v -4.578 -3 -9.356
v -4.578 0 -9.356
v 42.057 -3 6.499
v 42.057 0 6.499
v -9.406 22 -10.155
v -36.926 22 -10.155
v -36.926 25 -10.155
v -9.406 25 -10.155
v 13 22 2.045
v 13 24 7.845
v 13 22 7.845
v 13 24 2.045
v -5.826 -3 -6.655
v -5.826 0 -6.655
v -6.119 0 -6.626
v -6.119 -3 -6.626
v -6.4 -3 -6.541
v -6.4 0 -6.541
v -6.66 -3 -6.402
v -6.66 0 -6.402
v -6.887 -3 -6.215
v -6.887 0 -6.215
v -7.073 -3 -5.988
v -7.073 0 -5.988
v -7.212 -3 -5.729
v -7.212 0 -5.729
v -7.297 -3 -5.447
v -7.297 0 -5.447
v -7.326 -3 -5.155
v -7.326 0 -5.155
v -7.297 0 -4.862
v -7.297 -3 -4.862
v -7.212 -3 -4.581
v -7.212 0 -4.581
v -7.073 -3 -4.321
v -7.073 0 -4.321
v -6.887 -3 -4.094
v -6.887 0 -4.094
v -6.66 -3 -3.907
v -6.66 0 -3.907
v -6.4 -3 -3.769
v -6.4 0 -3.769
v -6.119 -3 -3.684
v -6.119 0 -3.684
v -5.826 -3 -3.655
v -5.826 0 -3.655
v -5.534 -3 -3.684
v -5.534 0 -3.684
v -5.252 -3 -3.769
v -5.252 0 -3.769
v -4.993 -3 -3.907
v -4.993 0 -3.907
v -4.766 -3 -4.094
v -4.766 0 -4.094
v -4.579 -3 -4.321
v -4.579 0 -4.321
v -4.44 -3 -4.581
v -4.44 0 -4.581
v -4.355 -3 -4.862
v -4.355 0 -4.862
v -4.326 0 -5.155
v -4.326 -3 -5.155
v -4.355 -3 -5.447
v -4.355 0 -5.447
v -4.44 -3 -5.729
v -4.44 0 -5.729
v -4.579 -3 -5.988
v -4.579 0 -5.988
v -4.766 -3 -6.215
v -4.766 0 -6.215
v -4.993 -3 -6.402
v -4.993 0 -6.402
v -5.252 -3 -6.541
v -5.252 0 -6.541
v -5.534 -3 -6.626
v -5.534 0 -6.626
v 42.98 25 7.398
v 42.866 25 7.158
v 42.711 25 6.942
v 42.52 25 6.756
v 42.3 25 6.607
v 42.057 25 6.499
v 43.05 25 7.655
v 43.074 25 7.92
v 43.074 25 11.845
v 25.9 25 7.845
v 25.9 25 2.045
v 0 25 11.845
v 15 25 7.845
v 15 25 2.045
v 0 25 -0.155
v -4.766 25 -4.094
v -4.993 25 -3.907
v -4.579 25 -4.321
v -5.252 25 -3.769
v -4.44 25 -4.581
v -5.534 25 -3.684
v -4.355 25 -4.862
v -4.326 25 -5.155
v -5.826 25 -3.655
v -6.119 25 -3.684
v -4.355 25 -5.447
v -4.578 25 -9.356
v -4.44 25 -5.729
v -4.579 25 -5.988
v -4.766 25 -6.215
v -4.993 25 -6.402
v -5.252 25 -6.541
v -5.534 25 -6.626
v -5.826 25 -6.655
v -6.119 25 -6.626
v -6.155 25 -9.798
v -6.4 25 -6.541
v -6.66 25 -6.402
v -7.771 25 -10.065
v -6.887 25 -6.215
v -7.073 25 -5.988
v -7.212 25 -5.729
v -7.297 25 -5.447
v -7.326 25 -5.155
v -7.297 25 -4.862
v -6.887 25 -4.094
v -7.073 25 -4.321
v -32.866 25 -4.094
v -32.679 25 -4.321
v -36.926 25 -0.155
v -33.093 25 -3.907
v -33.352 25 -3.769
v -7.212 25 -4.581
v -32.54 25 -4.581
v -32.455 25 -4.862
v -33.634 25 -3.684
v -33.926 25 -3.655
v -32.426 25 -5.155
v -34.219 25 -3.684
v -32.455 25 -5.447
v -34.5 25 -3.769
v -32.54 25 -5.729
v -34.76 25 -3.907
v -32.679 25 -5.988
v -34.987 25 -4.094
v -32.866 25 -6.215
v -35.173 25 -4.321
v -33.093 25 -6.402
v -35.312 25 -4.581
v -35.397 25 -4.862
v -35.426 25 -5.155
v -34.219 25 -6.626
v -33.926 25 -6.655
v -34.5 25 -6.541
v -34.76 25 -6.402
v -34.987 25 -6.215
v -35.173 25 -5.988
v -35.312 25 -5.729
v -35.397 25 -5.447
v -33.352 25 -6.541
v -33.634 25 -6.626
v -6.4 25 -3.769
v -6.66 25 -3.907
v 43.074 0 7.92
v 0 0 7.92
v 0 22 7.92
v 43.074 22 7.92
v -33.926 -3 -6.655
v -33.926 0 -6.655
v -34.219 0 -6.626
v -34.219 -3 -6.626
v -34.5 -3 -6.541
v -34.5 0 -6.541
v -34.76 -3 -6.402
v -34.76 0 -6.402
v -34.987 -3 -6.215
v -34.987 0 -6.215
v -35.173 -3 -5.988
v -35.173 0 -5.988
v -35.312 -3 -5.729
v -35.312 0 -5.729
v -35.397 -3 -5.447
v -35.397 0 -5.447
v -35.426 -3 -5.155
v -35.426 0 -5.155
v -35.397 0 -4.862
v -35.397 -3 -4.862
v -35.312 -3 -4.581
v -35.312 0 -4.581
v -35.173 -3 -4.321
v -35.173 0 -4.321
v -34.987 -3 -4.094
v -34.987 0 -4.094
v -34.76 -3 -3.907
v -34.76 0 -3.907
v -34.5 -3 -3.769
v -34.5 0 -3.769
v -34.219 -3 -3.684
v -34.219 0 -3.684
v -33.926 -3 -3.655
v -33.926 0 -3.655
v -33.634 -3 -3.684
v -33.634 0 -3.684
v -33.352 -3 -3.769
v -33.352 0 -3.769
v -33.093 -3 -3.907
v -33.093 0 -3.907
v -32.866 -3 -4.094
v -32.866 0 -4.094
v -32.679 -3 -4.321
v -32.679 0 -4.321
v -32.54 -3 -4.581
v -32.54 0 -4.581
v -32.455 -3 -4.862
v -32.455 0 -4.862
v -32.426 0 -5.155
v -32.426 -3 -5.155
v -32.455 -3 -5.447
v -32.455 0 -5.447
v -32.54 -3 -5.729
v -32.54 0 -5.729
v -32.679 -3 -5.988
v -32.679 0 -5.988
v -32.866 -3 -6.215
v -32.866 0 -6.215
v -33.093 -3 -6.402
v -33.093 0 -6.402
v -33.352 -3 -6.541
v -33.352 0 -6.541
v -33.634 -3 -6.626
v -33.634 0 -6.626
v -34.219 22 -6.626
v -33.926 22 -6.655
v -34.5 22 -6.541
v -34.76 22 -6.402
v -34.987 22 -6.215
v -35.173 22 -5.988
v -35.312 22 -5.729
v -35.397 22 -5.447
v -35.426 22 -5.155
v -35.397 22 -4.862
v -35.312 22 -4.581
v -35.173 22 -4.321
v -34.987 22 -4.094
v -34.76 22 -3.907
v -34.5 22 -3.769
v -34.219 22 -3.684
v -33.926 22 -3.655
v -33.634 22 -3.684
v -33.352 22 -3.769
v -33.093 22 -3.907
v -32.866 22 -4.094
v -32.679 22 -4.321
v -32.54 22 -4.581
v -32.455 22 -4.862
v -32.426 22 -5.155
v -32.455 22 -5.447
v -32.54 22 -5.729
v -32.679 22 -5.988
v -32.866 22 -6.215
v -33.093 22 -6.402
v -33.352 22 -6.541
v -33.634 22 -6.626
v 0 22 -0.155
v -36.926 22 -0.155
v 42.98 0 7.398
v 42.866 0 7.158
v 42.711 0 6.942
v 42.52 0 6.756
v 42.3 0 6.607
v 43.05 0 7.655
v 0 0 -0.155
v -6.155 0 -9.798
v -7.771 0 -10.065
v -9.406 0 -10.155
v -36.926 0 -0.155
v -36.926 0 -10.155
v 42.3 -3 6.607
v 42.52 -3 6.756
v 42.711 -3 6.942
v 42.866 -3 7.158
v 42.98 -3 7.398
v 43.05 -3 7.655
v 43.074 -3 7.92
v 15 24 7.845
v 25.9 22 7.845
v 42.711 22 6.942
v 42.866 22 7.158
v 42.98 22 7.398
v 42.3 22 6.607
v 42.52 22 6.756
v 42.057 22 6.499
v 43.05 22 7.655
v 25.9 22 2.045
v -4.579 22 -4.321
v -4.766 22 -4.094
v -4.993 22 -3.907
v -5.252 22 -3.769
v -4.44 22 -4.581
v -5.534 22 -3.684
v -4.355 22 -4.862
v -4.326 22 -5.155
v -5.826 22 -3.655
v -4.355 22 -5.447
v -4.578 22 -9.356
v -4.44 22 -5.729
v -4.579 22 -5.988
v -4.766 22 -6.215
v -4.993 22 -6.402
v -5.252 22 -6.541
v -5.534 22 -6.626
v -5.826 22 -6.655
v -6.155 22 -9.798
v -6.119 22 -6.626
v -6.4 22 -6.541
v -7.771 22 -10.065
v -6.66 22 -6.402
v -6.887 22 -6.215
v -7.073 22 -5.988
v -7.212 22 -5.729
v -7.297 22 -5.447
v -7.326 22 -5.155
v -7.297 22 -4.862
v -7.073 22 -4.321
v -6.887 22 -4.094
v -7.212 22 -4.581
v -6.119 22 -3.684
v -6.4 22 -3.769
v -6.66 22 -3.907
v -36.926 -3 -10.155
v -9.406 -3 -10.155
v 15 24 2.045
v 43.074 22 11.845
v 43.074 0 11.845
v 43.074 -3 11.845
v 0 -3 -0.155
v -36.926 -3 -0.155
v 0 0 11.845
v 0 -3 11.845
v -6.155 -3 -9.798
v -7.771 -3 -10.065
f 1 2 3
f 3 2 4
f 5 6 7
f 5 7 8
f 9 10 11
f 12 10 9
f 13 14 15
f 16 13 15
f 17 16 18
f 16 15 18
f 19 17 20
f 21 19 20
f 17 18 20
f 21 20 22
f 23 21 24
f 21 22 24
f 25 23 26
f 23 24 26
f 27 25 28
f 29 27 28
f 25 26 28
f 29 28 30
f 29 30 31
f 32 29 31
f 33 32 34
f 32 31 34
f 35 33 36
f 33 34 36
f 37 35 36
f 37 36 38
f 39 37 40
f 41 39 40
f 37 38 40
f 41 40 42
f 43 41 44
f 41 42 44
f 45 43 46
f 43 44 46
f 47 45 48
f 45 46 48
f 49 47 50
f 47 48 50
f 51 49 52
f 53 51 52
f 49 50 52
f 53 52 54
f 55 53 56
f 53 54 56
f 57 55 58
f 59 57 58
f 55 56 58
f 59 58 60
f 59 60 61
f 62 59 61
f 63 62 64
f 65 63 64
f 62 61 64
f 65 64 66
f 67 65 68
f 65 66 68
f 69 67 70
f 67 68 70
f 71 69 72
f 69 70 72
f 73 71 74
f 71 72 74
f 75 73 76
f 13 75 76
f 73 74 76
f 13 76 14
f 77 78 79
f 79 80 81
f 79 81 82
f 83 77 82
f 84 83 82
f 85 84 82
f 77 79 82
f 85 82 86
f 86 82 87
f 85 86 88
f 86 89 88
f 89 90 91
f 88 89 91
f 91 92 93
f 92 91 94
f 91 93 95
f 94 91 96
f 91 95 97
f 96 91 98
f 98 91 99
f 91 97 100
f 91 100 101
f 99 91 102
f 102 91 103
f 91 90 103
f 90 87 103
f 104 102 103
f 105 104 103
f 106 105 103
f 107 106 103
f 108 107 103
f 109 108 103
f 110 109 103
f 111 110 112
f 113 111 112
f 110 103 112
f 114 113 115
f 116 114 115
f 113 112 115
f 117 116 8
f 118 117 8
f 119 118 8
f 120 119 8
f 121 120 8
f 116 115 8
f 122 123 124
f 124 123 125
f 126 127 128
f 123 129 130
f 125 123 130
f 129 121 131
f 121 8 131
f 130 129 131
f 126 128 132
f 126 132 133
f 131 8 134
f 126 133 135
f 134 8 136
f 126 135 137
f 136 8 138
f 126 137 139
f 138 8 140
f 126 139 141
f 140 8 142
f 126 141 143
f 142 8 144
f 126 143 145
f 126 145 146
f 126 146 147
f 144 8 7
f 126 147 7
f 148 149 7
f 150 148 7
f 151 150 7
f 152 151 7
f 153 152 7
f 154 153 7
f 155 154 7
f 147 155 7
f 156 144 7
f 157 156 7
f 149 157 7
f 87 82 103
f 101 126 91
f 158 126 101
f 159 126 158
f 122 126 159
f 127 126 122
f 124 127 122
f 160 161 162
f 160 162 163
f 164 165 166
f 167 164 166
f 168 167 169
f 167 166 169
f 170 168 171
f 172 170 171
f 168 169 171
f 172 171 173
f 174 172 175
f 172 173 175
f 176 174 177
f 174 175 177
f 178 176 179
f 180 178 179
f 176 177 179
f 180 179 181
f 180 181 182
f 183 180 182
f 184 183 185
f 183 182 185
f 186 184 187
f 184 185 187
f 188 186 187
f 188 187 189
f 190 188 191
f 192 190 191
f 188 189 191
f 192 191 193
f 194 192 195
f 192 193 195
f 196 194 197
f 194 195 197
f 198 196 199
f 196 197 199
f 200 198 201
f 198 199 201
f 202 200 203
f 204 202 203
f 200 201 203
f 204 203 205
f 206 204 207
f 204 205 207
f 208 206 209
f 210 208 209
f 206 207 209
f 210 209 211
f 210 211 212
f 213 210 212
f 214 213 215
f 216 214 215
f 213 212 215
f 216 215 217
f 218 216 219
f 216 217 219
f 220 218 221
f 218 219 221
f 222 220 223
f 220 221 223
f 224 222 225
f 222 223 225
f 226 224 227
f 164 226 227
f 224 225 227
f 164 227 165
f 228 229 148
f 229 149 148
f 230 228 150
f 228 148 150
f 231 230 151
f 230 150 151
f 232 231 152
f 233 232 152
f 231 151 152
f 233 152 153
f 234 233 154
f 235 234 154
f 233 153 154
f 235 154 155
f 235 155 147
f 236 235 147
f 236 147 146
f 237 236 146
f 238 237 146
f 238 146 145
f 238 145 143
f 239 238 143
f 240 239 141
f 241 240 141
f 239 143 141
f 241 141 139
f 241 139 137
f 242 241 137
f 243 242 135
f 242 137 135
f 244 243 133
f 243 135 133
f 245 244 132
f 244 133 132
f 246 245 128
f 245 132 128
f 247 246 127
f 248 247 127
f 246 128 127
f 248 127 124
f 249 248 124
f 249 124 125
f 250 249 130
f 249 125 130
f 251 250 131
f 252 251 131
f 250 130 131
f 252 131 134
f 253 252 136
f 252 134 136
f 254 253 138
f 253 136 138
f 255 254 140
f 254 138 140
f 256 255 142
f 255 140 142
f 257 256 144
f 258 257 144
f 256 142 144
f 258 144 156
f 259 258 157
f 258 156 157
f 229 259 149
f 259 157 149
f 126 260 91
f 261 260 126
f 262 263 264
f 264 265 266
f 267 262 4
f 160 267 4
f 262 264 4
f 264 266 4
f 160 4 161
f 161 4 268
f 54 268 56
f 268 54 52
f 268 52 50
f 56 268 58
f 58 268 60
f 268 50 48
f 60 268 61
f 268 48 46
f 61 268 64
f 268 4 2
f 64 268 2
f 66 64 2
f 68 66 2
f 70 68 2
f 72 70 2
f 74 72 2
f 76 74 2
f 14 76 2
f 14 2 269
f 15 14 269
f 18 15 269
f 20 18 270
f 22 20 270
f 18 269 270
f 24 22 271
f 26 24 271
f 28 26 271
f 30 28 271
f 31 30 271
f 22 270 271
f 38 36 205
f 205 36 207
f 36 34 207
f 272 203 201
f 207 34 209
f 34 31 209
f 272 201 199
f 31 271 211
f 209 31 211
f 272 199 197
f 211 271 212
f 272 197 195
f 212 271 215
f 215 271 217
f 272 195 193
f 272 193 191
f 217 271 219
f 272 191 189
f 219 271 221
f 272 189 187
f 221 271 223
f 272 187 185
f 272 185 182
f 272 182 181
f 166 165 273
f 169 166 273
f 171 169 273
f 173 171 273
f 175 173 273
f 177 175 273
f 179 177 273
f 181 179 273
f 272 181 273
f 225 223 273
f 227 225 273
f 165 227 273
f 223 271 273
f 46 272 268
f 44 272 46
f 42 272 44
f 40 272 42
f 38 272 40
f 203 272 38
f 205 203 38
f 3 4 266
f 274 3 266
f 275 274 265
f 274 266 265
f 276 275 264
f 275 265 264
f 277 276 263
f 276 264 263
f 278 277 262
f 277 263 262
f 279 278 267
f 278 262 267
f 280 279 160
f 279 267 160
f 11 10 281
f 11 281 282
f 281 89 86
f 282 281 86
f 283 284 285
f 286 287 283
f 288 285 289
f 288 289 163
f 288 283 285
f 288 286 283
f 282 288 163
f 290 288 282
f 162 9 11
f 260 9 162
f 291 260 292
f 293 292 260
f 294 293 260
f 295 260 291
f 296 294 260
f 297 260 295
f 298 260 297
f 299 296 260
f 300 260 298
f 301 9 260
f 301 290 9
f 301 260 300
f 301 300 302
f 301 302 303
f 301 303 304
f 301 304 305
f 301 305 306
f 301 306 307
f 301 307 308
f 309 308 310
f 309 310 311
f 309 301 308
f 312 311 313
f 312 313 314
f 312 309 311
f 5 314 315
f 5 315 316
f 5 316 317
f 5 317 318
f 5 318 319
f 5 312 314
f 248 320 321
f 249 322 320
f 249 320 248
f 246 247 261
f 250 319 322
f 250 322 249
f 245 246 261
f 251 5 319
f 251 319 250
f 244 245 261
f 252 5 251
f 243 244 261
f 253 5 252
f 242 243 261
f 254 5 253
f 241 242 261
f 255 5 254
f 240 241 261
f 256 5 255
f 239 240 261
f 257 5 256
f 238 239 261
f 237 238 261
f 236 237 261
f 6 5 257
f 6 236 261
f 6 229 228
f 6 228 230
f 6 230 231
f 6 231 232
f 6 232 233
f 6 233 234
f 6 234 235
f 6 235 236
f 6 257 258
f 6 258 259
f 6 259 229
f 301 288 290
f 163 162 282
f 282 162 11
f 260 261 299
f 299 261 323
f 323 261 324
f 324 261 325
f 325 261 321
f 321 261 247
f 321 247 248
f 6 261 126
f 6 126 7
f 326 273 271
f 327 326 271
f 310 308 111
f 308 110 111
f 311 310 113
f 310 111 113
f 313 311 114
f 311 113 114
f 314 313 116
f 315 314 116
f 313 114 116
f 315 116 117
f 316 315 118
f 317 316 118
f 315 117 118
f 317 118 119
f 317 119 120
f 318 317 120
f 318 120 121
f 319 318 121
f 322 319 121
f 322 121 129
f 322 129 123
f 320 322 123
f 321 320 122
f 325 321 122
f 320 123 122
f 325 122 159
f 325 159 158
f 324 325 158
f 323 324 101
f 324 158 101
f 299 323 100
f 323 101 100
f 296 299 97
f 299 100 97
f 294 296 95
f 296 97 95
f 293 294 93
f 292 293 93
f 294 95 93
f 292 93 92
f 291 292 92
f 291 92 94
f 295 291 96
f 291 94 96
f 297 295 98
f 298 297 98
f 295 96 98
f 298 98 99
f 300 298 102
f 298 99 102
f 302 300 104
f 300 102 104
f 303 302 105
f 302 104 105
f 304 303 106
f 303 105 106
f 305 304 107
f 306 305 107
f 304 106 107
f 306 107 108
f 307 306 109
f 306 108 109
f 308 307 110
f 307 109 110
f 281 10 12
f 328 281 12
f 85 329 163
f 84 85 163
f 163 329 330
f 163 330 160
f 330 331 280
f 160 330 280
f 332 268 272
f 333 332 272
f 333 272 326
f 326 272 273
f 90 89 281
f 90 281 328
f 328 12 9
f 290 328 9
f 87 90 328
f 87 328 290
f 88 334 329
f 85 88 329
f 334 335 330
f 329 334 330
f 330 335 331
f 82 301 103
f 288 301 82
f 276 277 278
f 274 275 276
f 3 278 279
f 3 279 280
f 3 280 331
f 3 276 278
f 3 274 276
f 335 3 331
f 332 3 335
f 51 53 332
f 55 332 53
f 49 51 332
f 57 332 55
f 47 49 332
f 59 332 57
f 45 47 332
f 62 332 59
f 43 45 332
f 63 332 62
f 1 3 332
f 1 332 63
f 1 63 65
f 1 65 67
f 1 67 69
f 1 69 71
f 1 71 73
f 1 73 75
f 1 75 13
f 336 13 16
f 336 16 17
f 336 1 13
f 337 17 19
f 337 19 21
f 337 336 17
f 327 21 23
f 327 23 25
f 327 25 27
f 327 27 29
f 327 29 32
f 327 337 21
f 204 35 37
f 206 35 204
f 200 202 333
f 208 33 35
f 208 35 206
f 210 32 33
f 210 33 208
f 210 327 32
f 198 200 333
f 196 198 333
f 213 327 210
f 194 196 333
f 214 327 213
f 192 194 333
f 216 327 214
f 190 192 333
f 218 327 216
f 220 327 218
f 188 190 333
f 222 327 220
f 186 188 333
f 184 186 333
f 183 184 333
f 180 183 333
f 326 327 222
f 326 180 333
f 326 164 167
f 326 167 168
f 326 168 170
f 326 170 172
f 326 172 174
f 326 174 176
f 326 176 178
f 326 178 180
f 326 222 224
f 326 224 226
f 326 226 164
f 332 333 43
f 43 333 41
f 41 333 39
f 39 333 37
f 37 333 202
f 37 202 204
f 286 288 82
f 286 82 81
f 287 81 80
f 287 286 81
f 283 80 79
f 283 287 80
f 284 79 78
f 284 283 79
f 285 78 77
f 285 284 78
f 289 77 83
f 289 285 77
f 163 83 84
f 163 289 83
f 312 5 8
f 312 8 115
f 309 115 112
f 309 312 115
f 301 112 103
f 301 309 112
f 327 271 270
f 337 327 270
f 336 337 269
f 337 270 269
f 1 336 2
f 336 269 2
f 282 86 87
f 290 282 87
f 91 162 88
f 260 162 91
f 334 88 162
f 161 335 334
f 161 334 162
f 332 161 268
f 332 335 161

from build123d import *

# Parameters (mm, degrees)
BOSS_EXTRUDE1_DEPTH                      = 3
BOSS_EXTRUDE2_START                      = 22
BOSS_EXTRUDE2_DEPTH                      = 3
SKETCH3_W                                = 1.5
SKETCH3_H                                = 28
F_3_0MM_CLEARANCE_DOWEL_HOLE1_AT_2_COUNT = 2
F_3_0MM_CLEARANCE_DOWEL_HOLE1_AT_2_PITCH = 28.1
SKETCH5_W                                = 43.073811931
SKETCH5_H                                = 3.925670489
BOSS_EXTRUDE3_DEPTH                      = 22
SKETCH6_W                                = 12.9
SKETCH6_H                                = 5.8
CUT_EXTRUDE1_DEPTH                       = 10
SKETCH7_W                                = 5.8
SKETCH7_H                                = 1
BOSS_EXTRUDE4_DEPTH                      = 2


with BuildPart() as part:
    # Sketch1 → Boss-Extrude1 (new body)
    with BuildSketch(Plane(origin=(0, 0, 0), x_dir=(1, 0, 0), z_dir=(0, 1, 0))):
        with BuildLine():
            Line((-4.577926811, 9.356292891), (42.056666031, -6.499468675))
            ThreePointArc((42.056666031, -6.499468675), (42.793295664, -7.04620955), (43.073811931, -7.919627792))
            Line((43.073811931, -7.919627792), (43.073811931, -11.845298281))
            Line((43.073811931, -11.845298281), (0, -11.845298281))
            Line((0, -11.845298281), (0, 0.154701719))
            Line((0, 0.154701719), (-36.926188069, 0.154701719))
            Line((-36.926188069, 0.154701719), (-36.926188069, 10.154701719))
            Line((-36.926188069, 10.154701719), (-9.406467809, 10.154701719))
            ThreePointArc((-9.406467809, 10.154701719), (-6.959415254, 9.953753506), (-4.577926811, 9.356292891))
        make_face()
    extrude(amount=-BOSS_EXTRUDE1_DEPTH)


with BuildPart() as body_2:
    # Sketch1<2> → Boss-Extrude2 (new body)
    with BuildSketch(Plane(origin=(0, 0, 0), x_dir=(1, 0, 0), z_dir=(0, 1, 0)).offset(BOSS_EXTRUDE2_START)):
        with BuildLine():
            Line((-4.577926811, 9.356292891), (42.056666031, -6.499468675))
            ThreePointArc((42.056666031, -6.499468675), (42.793295664, -7.04620955), (43.073811931, -7.919627792))
            Line((43.073811931, -7.919627792), (43.073811931, -11.845298281))
            Line((43.073811931, -11.845298281), (0, -11.845298281))
            Line((0, -11.845298281), (0, 0.154701719))
            Line((0, 0.154701719), (-36.926188069, 0.154701719))
            Line((-36.926188069, 0.154701719), (-36.926188069, 10.154701719))
            Line((-36.926188069, 10.154701719), (-9.406467809, 10.154701719))
            ThreePointArc((-9.406467809, 10.154701719), (-6.959415254, 9.953753506), (-4.577926811, 9.356292891))
        make_face()
    extrude(amount=BOSS_EXTRUDE2_DEPTH)


with BuildPart() as f_3_0mm_clearance_dowel_hole1_tool:
    # Sketch3 → Ø3.0mm Clearance Dowel Hole1 (revolve)
    with BuildSketch(Plane(origin=(-33.926188069, -3, -5.154701719), x_dir=(0, 0, -1), z_dir=(1, 0, 0))):
        with Locations((0.75, 14)):
            Rectangle(SKETCH3_W, SKETCH3_H)
    f_3_0mm_clearance_dowel_hole1 = revolve(axis=Axis((-33.926188069, -9.35, -5.154701719), (0, 1, 0)))


with BuildPart() as part_1:
    add(part.part)

    # Ø3.0mm Clearance Dowel Hole1: cut by f_3_0mm_clearance_dowel_hole1_tool
    add(f_3_0mm_clearance_dowel_hole1_tool.part, mode=Mode.SUBTRACT)


with BuildPart() as body_2_1:
    add(body_2.part)

    # Ø3.0mm Clearance Dowel Hole1: cut by f_3_0mm_clearance_dowel_hole1_tool
    add(f_3_0mm_clearance_dowel_hole1_tool.part, mode=Mode.SUBTRACT)


with BuildPart() as f_3_0mm_clearance_dowel_hole1_at_2_tool:
    # Ø3.0mm Clearance Dowel Hole1 at 2: Ø3.0mm Clearance Dowel Hole1 ×2
    with Locations(*[(i * F_3_0MM_CLEARANCE_DOWEL_HOLE1_AT_2_PITCH, 0, 0) for i in range(1, F_3_0MM_CLEARANCE_DOWEL_HOLE1_AT_2_COUNT)]):
        add(f_3_0mm_clearance_dowel_hole1)


with BuildPart() as part_2:
    add(part_1.part)

    # Ø3.0mm Clearance Dowel Hole1 at 2: cut by f_3_0mm_clearance_dowel_hole1_at_2_tool
    add(f_3_0mm_clearance_dowel_hole1_at_2_tool.part, mode=Mode.SUBTRACT)



with BuildPart() as body_2_2:
    add(body_2_1.part)

    # Ø3.0mm Clearance Dowel Hole1 at 2: cut by f_3_0mm_clearance_dowel_hole1_at_2_tool
    add(f_3_0mm_clearance_dowel_hole1_at_2_tool.part, mode=Mode.SUBTRACT)


with BuildPart() as part_3:
    add(part_2.part)

    add(body_2_2.part)  # Boss-Extrude3 merges body 2
    # Sketch5 → Boss-Extrude3 (add)
    with BuildSketch(Plane(origin=(0, 0, 0), x_dir=(1, 0, 0), z_dir=(0, 1, 0))):
        with Locations((21.536905966, -9.882463037)):
            Rectangle(SKETCH5_W, SKETCH5_H)
    extrude(amount=BOSS_EXTRUDE3_DEPTH)

    # Sketch6 → Cut-Extrude1 (cut)
    with BuildSketch(Plane(origin=(0, 25, 0), x_dir=(1, 0, 0), z_dir=(0, 1, 0))):
        with Locations((19.45, -4.945298281)):
            Rectangle(SKETCH6_W, SKETCH6_H)
    extrude(amount=-CUT_EXTRUDE1_DEPTH, mode=Mode.SUBTRACT)

    # Sketch7 → Boss-Extrude4 (add)
    with BuildSketch(Plane(origin=(13, 0, 0), x_dir=(0, 0, -1), z_dir=(1, 0, 0))):
        with Locations((-4.945298281, 24.5)):
            Rectangle(SKETCH7_W, SKETCH7_H)
    extrude(amount=BOSS_EXTRUDE4_DEPTH)


solid = part_3.part
